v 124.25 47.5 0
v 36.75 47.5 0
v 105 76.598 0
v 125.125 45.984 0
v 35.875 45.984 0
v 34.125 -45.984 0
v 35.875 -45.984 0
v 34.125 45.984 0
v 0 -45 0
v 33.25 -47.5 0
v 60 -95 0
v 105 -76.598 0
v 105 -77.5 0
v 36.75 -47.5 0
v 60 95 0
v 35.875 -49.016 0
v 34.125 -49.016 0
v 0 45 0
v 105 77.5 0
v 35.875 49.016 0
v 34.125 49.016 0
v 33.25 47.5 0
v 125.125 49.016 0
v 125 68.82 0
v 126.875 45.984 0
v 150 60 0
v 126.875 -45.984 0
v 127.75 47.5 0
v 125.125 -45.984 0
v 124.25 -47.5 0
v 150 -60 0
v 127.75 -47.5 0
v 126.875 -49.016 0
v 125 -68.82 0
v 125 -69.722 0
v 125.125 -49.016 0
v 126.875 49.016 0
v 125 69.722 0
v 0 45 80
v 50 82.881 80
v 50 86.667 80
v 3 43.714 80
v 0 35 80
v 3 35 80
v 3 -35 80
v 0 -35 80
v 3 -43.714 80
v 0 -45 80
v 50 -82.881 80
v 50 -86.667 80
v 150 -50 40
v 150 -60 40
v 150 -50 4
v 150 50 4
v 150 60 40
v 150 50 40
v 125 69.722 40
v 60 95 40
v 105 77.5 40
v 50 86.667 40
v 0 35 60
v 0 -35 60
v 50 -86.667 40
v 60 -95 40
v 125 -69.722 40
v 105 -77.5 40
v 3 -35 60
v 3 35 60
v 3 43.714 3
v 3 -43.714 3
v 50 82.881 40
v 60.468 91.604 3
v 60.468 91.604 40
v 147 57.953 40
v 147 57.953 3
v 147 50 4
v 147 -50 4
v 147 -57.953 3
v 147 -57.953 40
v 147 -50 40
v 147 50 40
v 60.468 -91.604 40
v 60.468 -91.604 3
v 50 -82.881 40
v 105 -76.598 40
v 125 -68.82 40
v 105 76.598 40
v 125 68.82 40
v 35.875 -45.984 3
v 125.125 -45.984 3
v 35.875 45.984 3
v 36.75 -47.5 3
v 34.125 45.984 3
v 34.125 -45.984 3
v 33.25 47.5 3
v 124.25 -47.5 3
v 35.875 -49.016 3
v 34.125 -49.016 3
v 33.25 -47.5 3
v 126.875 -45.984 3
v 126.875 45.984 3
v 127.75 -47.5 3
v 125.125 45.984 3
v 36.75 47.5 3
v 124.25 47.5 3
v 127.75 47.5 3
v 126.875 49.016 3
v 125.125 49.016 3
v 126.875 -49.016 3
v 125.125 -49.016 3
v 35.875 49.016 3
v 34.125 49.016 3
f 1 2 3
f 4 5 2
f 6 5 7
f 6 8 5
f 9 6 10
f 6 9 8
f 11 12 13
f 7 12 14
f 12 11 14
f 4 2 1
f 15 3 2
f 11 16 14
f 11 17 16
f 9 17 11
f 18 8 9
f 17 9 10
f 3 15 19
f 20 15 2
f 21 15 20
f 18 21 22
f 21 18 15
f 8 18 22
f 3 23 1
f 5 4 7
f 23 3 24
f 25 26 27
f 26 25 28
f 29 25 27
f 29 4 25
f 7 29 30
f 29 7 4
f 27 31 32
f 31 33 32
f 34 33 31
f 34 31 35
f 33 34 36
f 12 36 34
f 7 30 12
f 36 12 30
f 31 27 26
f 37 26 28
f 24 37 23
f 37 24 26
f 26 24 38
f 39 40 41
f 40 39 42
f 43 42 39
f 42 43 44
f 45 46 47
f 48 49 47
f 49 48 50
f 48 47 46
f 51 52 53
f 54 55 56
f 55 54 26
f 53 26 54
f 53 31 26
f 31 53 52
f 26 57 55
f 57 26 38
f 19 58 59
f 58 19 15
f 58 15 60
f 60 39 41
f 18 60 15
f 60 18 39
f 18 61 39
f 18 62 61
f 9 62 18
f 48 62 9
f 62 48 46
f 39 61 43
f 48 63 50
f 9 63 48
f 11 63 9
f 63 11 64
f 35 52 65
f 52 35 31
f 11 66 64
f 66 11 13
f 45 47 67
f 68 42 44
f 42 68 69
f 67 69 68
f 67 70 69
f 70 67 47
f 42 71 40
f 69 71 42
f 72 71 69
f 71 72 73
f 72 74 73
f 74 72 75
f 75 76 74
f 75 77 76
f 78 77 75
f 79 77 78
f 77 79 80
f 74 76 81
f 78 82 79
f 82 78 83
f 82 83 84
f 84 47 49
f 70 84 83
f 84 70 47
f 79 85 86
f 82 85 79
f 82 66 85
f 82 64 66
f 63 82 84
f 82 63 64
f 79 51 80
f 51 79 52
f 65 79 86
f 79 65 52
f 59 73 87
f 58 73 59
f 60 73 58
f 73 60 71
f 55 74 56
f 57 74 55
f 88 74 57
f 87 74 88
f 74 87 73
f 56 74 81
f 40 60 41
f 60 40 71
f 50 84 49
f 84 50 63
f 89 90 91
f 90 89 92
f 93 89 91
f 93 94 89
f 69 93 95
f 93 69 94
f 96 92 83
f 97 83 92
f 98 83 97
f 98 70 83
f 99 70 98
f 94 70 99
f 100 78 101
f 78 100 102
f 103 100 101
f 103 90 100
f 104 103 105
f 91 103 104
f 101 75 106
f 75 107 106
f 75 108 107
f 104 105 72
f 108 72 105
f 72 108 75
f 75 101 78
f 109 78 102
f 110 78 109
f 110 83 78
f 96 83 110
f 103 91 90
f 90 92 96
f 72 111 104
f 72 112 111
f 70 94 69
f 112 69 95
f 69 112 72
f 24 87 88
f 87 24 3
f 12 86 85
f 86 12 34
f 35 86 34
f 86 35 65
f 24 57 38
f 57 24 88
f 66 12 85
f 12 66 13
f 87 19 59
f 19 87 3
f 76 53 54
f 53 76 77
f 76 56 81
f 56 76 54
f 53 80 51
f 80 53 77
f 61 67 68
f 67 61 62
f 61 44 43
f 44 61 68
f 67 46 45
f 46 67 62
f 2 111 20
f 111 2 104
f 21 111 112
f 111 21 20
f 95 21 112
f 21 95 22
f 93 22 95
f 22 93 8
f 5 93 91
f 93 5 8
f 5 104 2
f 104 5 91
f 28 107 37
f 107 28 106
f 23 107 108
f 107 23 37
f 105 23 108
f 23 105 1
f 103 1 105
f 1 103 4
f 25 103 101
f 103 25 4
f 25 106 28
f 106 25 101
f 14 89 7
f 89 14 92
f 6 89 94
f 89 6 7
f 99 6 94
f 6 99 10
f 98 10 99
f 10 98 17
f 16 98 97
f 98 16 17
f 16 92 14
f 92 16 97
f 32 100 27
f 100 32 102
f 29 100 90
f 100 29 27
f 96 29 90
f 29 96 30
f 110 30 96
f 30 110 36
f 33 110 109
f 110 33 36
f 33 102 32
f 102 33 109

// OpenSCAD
// screw offset from front of canopy to first screw
screw_offset = 35;

// thickness of canopy walls
canopy_t = 3;

// thickness of strap inset
strap_t = 1;

// width of strap cut
strap_w = 20;

// screw x separation
screw_x = 91;

// screw y separation
screw_y = 95;

// screw drill hole diameter
screw_d = 3.5;


module outset(r) {
    minkowski() {
        circle(r=r);
        children();
    }
}

module inverse() {
	difference() {
		square(1e5,center=true);
		children();
	}
}

module fillet(r=1) {
	inset(r=r) render() outset(r=r) children();
}

module rounding(r=1) {
	outset(r=r) inset(r=r) children();
}

module inset(r) {
    inverse() outset(r) inverse() children();
}

module half_body_shape() {
    polygon([[0, 0], [0, 45], [60, 95], [150, 60], [150, 0]]);
}

module body_shape() {
    half_body_shape();
    mirror([0, 1, 0]) half_body_shape();
}

module body_perimeter(t) {
    difference() {
        body_shape();
        inset(t) body_shape();
    }
}

module canopy(t, t_strap) {
    render() difference() {
        union() {
            linear_extrude(t) body_shape();
            difference() {
                linear_extrude(80) body_perimeter(t);
                translate([50, -500, 40]) cube([100, 1000, 100], center=false);
            }
        }
    }
}

module strap_cuts() {
    render() translate([0, 0, -50]) intersection() {
        linear_extrude(100) difference() {
            outset(canopy_t) body_shape();
            inset(strap_t) body_shape();
        };
        translate([105, -500, 0]) cube([strap_w, 1000, 100]);
    }
}

module drill_holes() {
    translate([screw_offset, 0, 0]) linear_extrude(100) {
        translate([0, screw_y/2]) circle(d=screw_d);
        translate([0, -screw_y/2]) circle(d=screw_d);
        translate([screw_x, screw_y/2]) circle(d=screw_d);
        translate([screw_x, -screw_y/2]) circle(d=screw_d);
    }
}

module accessory_port_back() {
    translate([80, -50, canopy_t + 1]) cube([100, 100, 60], center=false);
}

module accessory_port_front() {
    translate([-40, 0, 0]) cube([100, 70, 20], center=true);
}

render() difference() {
    canopy(canopy_t, strap_t);
    accessory_port_back();
    translate([0, 0, 70]) accessory_port_front();
    //translate([0, 0, 20]) accessory_port_front();
    drill_holes();
    strap_cuts();
}
